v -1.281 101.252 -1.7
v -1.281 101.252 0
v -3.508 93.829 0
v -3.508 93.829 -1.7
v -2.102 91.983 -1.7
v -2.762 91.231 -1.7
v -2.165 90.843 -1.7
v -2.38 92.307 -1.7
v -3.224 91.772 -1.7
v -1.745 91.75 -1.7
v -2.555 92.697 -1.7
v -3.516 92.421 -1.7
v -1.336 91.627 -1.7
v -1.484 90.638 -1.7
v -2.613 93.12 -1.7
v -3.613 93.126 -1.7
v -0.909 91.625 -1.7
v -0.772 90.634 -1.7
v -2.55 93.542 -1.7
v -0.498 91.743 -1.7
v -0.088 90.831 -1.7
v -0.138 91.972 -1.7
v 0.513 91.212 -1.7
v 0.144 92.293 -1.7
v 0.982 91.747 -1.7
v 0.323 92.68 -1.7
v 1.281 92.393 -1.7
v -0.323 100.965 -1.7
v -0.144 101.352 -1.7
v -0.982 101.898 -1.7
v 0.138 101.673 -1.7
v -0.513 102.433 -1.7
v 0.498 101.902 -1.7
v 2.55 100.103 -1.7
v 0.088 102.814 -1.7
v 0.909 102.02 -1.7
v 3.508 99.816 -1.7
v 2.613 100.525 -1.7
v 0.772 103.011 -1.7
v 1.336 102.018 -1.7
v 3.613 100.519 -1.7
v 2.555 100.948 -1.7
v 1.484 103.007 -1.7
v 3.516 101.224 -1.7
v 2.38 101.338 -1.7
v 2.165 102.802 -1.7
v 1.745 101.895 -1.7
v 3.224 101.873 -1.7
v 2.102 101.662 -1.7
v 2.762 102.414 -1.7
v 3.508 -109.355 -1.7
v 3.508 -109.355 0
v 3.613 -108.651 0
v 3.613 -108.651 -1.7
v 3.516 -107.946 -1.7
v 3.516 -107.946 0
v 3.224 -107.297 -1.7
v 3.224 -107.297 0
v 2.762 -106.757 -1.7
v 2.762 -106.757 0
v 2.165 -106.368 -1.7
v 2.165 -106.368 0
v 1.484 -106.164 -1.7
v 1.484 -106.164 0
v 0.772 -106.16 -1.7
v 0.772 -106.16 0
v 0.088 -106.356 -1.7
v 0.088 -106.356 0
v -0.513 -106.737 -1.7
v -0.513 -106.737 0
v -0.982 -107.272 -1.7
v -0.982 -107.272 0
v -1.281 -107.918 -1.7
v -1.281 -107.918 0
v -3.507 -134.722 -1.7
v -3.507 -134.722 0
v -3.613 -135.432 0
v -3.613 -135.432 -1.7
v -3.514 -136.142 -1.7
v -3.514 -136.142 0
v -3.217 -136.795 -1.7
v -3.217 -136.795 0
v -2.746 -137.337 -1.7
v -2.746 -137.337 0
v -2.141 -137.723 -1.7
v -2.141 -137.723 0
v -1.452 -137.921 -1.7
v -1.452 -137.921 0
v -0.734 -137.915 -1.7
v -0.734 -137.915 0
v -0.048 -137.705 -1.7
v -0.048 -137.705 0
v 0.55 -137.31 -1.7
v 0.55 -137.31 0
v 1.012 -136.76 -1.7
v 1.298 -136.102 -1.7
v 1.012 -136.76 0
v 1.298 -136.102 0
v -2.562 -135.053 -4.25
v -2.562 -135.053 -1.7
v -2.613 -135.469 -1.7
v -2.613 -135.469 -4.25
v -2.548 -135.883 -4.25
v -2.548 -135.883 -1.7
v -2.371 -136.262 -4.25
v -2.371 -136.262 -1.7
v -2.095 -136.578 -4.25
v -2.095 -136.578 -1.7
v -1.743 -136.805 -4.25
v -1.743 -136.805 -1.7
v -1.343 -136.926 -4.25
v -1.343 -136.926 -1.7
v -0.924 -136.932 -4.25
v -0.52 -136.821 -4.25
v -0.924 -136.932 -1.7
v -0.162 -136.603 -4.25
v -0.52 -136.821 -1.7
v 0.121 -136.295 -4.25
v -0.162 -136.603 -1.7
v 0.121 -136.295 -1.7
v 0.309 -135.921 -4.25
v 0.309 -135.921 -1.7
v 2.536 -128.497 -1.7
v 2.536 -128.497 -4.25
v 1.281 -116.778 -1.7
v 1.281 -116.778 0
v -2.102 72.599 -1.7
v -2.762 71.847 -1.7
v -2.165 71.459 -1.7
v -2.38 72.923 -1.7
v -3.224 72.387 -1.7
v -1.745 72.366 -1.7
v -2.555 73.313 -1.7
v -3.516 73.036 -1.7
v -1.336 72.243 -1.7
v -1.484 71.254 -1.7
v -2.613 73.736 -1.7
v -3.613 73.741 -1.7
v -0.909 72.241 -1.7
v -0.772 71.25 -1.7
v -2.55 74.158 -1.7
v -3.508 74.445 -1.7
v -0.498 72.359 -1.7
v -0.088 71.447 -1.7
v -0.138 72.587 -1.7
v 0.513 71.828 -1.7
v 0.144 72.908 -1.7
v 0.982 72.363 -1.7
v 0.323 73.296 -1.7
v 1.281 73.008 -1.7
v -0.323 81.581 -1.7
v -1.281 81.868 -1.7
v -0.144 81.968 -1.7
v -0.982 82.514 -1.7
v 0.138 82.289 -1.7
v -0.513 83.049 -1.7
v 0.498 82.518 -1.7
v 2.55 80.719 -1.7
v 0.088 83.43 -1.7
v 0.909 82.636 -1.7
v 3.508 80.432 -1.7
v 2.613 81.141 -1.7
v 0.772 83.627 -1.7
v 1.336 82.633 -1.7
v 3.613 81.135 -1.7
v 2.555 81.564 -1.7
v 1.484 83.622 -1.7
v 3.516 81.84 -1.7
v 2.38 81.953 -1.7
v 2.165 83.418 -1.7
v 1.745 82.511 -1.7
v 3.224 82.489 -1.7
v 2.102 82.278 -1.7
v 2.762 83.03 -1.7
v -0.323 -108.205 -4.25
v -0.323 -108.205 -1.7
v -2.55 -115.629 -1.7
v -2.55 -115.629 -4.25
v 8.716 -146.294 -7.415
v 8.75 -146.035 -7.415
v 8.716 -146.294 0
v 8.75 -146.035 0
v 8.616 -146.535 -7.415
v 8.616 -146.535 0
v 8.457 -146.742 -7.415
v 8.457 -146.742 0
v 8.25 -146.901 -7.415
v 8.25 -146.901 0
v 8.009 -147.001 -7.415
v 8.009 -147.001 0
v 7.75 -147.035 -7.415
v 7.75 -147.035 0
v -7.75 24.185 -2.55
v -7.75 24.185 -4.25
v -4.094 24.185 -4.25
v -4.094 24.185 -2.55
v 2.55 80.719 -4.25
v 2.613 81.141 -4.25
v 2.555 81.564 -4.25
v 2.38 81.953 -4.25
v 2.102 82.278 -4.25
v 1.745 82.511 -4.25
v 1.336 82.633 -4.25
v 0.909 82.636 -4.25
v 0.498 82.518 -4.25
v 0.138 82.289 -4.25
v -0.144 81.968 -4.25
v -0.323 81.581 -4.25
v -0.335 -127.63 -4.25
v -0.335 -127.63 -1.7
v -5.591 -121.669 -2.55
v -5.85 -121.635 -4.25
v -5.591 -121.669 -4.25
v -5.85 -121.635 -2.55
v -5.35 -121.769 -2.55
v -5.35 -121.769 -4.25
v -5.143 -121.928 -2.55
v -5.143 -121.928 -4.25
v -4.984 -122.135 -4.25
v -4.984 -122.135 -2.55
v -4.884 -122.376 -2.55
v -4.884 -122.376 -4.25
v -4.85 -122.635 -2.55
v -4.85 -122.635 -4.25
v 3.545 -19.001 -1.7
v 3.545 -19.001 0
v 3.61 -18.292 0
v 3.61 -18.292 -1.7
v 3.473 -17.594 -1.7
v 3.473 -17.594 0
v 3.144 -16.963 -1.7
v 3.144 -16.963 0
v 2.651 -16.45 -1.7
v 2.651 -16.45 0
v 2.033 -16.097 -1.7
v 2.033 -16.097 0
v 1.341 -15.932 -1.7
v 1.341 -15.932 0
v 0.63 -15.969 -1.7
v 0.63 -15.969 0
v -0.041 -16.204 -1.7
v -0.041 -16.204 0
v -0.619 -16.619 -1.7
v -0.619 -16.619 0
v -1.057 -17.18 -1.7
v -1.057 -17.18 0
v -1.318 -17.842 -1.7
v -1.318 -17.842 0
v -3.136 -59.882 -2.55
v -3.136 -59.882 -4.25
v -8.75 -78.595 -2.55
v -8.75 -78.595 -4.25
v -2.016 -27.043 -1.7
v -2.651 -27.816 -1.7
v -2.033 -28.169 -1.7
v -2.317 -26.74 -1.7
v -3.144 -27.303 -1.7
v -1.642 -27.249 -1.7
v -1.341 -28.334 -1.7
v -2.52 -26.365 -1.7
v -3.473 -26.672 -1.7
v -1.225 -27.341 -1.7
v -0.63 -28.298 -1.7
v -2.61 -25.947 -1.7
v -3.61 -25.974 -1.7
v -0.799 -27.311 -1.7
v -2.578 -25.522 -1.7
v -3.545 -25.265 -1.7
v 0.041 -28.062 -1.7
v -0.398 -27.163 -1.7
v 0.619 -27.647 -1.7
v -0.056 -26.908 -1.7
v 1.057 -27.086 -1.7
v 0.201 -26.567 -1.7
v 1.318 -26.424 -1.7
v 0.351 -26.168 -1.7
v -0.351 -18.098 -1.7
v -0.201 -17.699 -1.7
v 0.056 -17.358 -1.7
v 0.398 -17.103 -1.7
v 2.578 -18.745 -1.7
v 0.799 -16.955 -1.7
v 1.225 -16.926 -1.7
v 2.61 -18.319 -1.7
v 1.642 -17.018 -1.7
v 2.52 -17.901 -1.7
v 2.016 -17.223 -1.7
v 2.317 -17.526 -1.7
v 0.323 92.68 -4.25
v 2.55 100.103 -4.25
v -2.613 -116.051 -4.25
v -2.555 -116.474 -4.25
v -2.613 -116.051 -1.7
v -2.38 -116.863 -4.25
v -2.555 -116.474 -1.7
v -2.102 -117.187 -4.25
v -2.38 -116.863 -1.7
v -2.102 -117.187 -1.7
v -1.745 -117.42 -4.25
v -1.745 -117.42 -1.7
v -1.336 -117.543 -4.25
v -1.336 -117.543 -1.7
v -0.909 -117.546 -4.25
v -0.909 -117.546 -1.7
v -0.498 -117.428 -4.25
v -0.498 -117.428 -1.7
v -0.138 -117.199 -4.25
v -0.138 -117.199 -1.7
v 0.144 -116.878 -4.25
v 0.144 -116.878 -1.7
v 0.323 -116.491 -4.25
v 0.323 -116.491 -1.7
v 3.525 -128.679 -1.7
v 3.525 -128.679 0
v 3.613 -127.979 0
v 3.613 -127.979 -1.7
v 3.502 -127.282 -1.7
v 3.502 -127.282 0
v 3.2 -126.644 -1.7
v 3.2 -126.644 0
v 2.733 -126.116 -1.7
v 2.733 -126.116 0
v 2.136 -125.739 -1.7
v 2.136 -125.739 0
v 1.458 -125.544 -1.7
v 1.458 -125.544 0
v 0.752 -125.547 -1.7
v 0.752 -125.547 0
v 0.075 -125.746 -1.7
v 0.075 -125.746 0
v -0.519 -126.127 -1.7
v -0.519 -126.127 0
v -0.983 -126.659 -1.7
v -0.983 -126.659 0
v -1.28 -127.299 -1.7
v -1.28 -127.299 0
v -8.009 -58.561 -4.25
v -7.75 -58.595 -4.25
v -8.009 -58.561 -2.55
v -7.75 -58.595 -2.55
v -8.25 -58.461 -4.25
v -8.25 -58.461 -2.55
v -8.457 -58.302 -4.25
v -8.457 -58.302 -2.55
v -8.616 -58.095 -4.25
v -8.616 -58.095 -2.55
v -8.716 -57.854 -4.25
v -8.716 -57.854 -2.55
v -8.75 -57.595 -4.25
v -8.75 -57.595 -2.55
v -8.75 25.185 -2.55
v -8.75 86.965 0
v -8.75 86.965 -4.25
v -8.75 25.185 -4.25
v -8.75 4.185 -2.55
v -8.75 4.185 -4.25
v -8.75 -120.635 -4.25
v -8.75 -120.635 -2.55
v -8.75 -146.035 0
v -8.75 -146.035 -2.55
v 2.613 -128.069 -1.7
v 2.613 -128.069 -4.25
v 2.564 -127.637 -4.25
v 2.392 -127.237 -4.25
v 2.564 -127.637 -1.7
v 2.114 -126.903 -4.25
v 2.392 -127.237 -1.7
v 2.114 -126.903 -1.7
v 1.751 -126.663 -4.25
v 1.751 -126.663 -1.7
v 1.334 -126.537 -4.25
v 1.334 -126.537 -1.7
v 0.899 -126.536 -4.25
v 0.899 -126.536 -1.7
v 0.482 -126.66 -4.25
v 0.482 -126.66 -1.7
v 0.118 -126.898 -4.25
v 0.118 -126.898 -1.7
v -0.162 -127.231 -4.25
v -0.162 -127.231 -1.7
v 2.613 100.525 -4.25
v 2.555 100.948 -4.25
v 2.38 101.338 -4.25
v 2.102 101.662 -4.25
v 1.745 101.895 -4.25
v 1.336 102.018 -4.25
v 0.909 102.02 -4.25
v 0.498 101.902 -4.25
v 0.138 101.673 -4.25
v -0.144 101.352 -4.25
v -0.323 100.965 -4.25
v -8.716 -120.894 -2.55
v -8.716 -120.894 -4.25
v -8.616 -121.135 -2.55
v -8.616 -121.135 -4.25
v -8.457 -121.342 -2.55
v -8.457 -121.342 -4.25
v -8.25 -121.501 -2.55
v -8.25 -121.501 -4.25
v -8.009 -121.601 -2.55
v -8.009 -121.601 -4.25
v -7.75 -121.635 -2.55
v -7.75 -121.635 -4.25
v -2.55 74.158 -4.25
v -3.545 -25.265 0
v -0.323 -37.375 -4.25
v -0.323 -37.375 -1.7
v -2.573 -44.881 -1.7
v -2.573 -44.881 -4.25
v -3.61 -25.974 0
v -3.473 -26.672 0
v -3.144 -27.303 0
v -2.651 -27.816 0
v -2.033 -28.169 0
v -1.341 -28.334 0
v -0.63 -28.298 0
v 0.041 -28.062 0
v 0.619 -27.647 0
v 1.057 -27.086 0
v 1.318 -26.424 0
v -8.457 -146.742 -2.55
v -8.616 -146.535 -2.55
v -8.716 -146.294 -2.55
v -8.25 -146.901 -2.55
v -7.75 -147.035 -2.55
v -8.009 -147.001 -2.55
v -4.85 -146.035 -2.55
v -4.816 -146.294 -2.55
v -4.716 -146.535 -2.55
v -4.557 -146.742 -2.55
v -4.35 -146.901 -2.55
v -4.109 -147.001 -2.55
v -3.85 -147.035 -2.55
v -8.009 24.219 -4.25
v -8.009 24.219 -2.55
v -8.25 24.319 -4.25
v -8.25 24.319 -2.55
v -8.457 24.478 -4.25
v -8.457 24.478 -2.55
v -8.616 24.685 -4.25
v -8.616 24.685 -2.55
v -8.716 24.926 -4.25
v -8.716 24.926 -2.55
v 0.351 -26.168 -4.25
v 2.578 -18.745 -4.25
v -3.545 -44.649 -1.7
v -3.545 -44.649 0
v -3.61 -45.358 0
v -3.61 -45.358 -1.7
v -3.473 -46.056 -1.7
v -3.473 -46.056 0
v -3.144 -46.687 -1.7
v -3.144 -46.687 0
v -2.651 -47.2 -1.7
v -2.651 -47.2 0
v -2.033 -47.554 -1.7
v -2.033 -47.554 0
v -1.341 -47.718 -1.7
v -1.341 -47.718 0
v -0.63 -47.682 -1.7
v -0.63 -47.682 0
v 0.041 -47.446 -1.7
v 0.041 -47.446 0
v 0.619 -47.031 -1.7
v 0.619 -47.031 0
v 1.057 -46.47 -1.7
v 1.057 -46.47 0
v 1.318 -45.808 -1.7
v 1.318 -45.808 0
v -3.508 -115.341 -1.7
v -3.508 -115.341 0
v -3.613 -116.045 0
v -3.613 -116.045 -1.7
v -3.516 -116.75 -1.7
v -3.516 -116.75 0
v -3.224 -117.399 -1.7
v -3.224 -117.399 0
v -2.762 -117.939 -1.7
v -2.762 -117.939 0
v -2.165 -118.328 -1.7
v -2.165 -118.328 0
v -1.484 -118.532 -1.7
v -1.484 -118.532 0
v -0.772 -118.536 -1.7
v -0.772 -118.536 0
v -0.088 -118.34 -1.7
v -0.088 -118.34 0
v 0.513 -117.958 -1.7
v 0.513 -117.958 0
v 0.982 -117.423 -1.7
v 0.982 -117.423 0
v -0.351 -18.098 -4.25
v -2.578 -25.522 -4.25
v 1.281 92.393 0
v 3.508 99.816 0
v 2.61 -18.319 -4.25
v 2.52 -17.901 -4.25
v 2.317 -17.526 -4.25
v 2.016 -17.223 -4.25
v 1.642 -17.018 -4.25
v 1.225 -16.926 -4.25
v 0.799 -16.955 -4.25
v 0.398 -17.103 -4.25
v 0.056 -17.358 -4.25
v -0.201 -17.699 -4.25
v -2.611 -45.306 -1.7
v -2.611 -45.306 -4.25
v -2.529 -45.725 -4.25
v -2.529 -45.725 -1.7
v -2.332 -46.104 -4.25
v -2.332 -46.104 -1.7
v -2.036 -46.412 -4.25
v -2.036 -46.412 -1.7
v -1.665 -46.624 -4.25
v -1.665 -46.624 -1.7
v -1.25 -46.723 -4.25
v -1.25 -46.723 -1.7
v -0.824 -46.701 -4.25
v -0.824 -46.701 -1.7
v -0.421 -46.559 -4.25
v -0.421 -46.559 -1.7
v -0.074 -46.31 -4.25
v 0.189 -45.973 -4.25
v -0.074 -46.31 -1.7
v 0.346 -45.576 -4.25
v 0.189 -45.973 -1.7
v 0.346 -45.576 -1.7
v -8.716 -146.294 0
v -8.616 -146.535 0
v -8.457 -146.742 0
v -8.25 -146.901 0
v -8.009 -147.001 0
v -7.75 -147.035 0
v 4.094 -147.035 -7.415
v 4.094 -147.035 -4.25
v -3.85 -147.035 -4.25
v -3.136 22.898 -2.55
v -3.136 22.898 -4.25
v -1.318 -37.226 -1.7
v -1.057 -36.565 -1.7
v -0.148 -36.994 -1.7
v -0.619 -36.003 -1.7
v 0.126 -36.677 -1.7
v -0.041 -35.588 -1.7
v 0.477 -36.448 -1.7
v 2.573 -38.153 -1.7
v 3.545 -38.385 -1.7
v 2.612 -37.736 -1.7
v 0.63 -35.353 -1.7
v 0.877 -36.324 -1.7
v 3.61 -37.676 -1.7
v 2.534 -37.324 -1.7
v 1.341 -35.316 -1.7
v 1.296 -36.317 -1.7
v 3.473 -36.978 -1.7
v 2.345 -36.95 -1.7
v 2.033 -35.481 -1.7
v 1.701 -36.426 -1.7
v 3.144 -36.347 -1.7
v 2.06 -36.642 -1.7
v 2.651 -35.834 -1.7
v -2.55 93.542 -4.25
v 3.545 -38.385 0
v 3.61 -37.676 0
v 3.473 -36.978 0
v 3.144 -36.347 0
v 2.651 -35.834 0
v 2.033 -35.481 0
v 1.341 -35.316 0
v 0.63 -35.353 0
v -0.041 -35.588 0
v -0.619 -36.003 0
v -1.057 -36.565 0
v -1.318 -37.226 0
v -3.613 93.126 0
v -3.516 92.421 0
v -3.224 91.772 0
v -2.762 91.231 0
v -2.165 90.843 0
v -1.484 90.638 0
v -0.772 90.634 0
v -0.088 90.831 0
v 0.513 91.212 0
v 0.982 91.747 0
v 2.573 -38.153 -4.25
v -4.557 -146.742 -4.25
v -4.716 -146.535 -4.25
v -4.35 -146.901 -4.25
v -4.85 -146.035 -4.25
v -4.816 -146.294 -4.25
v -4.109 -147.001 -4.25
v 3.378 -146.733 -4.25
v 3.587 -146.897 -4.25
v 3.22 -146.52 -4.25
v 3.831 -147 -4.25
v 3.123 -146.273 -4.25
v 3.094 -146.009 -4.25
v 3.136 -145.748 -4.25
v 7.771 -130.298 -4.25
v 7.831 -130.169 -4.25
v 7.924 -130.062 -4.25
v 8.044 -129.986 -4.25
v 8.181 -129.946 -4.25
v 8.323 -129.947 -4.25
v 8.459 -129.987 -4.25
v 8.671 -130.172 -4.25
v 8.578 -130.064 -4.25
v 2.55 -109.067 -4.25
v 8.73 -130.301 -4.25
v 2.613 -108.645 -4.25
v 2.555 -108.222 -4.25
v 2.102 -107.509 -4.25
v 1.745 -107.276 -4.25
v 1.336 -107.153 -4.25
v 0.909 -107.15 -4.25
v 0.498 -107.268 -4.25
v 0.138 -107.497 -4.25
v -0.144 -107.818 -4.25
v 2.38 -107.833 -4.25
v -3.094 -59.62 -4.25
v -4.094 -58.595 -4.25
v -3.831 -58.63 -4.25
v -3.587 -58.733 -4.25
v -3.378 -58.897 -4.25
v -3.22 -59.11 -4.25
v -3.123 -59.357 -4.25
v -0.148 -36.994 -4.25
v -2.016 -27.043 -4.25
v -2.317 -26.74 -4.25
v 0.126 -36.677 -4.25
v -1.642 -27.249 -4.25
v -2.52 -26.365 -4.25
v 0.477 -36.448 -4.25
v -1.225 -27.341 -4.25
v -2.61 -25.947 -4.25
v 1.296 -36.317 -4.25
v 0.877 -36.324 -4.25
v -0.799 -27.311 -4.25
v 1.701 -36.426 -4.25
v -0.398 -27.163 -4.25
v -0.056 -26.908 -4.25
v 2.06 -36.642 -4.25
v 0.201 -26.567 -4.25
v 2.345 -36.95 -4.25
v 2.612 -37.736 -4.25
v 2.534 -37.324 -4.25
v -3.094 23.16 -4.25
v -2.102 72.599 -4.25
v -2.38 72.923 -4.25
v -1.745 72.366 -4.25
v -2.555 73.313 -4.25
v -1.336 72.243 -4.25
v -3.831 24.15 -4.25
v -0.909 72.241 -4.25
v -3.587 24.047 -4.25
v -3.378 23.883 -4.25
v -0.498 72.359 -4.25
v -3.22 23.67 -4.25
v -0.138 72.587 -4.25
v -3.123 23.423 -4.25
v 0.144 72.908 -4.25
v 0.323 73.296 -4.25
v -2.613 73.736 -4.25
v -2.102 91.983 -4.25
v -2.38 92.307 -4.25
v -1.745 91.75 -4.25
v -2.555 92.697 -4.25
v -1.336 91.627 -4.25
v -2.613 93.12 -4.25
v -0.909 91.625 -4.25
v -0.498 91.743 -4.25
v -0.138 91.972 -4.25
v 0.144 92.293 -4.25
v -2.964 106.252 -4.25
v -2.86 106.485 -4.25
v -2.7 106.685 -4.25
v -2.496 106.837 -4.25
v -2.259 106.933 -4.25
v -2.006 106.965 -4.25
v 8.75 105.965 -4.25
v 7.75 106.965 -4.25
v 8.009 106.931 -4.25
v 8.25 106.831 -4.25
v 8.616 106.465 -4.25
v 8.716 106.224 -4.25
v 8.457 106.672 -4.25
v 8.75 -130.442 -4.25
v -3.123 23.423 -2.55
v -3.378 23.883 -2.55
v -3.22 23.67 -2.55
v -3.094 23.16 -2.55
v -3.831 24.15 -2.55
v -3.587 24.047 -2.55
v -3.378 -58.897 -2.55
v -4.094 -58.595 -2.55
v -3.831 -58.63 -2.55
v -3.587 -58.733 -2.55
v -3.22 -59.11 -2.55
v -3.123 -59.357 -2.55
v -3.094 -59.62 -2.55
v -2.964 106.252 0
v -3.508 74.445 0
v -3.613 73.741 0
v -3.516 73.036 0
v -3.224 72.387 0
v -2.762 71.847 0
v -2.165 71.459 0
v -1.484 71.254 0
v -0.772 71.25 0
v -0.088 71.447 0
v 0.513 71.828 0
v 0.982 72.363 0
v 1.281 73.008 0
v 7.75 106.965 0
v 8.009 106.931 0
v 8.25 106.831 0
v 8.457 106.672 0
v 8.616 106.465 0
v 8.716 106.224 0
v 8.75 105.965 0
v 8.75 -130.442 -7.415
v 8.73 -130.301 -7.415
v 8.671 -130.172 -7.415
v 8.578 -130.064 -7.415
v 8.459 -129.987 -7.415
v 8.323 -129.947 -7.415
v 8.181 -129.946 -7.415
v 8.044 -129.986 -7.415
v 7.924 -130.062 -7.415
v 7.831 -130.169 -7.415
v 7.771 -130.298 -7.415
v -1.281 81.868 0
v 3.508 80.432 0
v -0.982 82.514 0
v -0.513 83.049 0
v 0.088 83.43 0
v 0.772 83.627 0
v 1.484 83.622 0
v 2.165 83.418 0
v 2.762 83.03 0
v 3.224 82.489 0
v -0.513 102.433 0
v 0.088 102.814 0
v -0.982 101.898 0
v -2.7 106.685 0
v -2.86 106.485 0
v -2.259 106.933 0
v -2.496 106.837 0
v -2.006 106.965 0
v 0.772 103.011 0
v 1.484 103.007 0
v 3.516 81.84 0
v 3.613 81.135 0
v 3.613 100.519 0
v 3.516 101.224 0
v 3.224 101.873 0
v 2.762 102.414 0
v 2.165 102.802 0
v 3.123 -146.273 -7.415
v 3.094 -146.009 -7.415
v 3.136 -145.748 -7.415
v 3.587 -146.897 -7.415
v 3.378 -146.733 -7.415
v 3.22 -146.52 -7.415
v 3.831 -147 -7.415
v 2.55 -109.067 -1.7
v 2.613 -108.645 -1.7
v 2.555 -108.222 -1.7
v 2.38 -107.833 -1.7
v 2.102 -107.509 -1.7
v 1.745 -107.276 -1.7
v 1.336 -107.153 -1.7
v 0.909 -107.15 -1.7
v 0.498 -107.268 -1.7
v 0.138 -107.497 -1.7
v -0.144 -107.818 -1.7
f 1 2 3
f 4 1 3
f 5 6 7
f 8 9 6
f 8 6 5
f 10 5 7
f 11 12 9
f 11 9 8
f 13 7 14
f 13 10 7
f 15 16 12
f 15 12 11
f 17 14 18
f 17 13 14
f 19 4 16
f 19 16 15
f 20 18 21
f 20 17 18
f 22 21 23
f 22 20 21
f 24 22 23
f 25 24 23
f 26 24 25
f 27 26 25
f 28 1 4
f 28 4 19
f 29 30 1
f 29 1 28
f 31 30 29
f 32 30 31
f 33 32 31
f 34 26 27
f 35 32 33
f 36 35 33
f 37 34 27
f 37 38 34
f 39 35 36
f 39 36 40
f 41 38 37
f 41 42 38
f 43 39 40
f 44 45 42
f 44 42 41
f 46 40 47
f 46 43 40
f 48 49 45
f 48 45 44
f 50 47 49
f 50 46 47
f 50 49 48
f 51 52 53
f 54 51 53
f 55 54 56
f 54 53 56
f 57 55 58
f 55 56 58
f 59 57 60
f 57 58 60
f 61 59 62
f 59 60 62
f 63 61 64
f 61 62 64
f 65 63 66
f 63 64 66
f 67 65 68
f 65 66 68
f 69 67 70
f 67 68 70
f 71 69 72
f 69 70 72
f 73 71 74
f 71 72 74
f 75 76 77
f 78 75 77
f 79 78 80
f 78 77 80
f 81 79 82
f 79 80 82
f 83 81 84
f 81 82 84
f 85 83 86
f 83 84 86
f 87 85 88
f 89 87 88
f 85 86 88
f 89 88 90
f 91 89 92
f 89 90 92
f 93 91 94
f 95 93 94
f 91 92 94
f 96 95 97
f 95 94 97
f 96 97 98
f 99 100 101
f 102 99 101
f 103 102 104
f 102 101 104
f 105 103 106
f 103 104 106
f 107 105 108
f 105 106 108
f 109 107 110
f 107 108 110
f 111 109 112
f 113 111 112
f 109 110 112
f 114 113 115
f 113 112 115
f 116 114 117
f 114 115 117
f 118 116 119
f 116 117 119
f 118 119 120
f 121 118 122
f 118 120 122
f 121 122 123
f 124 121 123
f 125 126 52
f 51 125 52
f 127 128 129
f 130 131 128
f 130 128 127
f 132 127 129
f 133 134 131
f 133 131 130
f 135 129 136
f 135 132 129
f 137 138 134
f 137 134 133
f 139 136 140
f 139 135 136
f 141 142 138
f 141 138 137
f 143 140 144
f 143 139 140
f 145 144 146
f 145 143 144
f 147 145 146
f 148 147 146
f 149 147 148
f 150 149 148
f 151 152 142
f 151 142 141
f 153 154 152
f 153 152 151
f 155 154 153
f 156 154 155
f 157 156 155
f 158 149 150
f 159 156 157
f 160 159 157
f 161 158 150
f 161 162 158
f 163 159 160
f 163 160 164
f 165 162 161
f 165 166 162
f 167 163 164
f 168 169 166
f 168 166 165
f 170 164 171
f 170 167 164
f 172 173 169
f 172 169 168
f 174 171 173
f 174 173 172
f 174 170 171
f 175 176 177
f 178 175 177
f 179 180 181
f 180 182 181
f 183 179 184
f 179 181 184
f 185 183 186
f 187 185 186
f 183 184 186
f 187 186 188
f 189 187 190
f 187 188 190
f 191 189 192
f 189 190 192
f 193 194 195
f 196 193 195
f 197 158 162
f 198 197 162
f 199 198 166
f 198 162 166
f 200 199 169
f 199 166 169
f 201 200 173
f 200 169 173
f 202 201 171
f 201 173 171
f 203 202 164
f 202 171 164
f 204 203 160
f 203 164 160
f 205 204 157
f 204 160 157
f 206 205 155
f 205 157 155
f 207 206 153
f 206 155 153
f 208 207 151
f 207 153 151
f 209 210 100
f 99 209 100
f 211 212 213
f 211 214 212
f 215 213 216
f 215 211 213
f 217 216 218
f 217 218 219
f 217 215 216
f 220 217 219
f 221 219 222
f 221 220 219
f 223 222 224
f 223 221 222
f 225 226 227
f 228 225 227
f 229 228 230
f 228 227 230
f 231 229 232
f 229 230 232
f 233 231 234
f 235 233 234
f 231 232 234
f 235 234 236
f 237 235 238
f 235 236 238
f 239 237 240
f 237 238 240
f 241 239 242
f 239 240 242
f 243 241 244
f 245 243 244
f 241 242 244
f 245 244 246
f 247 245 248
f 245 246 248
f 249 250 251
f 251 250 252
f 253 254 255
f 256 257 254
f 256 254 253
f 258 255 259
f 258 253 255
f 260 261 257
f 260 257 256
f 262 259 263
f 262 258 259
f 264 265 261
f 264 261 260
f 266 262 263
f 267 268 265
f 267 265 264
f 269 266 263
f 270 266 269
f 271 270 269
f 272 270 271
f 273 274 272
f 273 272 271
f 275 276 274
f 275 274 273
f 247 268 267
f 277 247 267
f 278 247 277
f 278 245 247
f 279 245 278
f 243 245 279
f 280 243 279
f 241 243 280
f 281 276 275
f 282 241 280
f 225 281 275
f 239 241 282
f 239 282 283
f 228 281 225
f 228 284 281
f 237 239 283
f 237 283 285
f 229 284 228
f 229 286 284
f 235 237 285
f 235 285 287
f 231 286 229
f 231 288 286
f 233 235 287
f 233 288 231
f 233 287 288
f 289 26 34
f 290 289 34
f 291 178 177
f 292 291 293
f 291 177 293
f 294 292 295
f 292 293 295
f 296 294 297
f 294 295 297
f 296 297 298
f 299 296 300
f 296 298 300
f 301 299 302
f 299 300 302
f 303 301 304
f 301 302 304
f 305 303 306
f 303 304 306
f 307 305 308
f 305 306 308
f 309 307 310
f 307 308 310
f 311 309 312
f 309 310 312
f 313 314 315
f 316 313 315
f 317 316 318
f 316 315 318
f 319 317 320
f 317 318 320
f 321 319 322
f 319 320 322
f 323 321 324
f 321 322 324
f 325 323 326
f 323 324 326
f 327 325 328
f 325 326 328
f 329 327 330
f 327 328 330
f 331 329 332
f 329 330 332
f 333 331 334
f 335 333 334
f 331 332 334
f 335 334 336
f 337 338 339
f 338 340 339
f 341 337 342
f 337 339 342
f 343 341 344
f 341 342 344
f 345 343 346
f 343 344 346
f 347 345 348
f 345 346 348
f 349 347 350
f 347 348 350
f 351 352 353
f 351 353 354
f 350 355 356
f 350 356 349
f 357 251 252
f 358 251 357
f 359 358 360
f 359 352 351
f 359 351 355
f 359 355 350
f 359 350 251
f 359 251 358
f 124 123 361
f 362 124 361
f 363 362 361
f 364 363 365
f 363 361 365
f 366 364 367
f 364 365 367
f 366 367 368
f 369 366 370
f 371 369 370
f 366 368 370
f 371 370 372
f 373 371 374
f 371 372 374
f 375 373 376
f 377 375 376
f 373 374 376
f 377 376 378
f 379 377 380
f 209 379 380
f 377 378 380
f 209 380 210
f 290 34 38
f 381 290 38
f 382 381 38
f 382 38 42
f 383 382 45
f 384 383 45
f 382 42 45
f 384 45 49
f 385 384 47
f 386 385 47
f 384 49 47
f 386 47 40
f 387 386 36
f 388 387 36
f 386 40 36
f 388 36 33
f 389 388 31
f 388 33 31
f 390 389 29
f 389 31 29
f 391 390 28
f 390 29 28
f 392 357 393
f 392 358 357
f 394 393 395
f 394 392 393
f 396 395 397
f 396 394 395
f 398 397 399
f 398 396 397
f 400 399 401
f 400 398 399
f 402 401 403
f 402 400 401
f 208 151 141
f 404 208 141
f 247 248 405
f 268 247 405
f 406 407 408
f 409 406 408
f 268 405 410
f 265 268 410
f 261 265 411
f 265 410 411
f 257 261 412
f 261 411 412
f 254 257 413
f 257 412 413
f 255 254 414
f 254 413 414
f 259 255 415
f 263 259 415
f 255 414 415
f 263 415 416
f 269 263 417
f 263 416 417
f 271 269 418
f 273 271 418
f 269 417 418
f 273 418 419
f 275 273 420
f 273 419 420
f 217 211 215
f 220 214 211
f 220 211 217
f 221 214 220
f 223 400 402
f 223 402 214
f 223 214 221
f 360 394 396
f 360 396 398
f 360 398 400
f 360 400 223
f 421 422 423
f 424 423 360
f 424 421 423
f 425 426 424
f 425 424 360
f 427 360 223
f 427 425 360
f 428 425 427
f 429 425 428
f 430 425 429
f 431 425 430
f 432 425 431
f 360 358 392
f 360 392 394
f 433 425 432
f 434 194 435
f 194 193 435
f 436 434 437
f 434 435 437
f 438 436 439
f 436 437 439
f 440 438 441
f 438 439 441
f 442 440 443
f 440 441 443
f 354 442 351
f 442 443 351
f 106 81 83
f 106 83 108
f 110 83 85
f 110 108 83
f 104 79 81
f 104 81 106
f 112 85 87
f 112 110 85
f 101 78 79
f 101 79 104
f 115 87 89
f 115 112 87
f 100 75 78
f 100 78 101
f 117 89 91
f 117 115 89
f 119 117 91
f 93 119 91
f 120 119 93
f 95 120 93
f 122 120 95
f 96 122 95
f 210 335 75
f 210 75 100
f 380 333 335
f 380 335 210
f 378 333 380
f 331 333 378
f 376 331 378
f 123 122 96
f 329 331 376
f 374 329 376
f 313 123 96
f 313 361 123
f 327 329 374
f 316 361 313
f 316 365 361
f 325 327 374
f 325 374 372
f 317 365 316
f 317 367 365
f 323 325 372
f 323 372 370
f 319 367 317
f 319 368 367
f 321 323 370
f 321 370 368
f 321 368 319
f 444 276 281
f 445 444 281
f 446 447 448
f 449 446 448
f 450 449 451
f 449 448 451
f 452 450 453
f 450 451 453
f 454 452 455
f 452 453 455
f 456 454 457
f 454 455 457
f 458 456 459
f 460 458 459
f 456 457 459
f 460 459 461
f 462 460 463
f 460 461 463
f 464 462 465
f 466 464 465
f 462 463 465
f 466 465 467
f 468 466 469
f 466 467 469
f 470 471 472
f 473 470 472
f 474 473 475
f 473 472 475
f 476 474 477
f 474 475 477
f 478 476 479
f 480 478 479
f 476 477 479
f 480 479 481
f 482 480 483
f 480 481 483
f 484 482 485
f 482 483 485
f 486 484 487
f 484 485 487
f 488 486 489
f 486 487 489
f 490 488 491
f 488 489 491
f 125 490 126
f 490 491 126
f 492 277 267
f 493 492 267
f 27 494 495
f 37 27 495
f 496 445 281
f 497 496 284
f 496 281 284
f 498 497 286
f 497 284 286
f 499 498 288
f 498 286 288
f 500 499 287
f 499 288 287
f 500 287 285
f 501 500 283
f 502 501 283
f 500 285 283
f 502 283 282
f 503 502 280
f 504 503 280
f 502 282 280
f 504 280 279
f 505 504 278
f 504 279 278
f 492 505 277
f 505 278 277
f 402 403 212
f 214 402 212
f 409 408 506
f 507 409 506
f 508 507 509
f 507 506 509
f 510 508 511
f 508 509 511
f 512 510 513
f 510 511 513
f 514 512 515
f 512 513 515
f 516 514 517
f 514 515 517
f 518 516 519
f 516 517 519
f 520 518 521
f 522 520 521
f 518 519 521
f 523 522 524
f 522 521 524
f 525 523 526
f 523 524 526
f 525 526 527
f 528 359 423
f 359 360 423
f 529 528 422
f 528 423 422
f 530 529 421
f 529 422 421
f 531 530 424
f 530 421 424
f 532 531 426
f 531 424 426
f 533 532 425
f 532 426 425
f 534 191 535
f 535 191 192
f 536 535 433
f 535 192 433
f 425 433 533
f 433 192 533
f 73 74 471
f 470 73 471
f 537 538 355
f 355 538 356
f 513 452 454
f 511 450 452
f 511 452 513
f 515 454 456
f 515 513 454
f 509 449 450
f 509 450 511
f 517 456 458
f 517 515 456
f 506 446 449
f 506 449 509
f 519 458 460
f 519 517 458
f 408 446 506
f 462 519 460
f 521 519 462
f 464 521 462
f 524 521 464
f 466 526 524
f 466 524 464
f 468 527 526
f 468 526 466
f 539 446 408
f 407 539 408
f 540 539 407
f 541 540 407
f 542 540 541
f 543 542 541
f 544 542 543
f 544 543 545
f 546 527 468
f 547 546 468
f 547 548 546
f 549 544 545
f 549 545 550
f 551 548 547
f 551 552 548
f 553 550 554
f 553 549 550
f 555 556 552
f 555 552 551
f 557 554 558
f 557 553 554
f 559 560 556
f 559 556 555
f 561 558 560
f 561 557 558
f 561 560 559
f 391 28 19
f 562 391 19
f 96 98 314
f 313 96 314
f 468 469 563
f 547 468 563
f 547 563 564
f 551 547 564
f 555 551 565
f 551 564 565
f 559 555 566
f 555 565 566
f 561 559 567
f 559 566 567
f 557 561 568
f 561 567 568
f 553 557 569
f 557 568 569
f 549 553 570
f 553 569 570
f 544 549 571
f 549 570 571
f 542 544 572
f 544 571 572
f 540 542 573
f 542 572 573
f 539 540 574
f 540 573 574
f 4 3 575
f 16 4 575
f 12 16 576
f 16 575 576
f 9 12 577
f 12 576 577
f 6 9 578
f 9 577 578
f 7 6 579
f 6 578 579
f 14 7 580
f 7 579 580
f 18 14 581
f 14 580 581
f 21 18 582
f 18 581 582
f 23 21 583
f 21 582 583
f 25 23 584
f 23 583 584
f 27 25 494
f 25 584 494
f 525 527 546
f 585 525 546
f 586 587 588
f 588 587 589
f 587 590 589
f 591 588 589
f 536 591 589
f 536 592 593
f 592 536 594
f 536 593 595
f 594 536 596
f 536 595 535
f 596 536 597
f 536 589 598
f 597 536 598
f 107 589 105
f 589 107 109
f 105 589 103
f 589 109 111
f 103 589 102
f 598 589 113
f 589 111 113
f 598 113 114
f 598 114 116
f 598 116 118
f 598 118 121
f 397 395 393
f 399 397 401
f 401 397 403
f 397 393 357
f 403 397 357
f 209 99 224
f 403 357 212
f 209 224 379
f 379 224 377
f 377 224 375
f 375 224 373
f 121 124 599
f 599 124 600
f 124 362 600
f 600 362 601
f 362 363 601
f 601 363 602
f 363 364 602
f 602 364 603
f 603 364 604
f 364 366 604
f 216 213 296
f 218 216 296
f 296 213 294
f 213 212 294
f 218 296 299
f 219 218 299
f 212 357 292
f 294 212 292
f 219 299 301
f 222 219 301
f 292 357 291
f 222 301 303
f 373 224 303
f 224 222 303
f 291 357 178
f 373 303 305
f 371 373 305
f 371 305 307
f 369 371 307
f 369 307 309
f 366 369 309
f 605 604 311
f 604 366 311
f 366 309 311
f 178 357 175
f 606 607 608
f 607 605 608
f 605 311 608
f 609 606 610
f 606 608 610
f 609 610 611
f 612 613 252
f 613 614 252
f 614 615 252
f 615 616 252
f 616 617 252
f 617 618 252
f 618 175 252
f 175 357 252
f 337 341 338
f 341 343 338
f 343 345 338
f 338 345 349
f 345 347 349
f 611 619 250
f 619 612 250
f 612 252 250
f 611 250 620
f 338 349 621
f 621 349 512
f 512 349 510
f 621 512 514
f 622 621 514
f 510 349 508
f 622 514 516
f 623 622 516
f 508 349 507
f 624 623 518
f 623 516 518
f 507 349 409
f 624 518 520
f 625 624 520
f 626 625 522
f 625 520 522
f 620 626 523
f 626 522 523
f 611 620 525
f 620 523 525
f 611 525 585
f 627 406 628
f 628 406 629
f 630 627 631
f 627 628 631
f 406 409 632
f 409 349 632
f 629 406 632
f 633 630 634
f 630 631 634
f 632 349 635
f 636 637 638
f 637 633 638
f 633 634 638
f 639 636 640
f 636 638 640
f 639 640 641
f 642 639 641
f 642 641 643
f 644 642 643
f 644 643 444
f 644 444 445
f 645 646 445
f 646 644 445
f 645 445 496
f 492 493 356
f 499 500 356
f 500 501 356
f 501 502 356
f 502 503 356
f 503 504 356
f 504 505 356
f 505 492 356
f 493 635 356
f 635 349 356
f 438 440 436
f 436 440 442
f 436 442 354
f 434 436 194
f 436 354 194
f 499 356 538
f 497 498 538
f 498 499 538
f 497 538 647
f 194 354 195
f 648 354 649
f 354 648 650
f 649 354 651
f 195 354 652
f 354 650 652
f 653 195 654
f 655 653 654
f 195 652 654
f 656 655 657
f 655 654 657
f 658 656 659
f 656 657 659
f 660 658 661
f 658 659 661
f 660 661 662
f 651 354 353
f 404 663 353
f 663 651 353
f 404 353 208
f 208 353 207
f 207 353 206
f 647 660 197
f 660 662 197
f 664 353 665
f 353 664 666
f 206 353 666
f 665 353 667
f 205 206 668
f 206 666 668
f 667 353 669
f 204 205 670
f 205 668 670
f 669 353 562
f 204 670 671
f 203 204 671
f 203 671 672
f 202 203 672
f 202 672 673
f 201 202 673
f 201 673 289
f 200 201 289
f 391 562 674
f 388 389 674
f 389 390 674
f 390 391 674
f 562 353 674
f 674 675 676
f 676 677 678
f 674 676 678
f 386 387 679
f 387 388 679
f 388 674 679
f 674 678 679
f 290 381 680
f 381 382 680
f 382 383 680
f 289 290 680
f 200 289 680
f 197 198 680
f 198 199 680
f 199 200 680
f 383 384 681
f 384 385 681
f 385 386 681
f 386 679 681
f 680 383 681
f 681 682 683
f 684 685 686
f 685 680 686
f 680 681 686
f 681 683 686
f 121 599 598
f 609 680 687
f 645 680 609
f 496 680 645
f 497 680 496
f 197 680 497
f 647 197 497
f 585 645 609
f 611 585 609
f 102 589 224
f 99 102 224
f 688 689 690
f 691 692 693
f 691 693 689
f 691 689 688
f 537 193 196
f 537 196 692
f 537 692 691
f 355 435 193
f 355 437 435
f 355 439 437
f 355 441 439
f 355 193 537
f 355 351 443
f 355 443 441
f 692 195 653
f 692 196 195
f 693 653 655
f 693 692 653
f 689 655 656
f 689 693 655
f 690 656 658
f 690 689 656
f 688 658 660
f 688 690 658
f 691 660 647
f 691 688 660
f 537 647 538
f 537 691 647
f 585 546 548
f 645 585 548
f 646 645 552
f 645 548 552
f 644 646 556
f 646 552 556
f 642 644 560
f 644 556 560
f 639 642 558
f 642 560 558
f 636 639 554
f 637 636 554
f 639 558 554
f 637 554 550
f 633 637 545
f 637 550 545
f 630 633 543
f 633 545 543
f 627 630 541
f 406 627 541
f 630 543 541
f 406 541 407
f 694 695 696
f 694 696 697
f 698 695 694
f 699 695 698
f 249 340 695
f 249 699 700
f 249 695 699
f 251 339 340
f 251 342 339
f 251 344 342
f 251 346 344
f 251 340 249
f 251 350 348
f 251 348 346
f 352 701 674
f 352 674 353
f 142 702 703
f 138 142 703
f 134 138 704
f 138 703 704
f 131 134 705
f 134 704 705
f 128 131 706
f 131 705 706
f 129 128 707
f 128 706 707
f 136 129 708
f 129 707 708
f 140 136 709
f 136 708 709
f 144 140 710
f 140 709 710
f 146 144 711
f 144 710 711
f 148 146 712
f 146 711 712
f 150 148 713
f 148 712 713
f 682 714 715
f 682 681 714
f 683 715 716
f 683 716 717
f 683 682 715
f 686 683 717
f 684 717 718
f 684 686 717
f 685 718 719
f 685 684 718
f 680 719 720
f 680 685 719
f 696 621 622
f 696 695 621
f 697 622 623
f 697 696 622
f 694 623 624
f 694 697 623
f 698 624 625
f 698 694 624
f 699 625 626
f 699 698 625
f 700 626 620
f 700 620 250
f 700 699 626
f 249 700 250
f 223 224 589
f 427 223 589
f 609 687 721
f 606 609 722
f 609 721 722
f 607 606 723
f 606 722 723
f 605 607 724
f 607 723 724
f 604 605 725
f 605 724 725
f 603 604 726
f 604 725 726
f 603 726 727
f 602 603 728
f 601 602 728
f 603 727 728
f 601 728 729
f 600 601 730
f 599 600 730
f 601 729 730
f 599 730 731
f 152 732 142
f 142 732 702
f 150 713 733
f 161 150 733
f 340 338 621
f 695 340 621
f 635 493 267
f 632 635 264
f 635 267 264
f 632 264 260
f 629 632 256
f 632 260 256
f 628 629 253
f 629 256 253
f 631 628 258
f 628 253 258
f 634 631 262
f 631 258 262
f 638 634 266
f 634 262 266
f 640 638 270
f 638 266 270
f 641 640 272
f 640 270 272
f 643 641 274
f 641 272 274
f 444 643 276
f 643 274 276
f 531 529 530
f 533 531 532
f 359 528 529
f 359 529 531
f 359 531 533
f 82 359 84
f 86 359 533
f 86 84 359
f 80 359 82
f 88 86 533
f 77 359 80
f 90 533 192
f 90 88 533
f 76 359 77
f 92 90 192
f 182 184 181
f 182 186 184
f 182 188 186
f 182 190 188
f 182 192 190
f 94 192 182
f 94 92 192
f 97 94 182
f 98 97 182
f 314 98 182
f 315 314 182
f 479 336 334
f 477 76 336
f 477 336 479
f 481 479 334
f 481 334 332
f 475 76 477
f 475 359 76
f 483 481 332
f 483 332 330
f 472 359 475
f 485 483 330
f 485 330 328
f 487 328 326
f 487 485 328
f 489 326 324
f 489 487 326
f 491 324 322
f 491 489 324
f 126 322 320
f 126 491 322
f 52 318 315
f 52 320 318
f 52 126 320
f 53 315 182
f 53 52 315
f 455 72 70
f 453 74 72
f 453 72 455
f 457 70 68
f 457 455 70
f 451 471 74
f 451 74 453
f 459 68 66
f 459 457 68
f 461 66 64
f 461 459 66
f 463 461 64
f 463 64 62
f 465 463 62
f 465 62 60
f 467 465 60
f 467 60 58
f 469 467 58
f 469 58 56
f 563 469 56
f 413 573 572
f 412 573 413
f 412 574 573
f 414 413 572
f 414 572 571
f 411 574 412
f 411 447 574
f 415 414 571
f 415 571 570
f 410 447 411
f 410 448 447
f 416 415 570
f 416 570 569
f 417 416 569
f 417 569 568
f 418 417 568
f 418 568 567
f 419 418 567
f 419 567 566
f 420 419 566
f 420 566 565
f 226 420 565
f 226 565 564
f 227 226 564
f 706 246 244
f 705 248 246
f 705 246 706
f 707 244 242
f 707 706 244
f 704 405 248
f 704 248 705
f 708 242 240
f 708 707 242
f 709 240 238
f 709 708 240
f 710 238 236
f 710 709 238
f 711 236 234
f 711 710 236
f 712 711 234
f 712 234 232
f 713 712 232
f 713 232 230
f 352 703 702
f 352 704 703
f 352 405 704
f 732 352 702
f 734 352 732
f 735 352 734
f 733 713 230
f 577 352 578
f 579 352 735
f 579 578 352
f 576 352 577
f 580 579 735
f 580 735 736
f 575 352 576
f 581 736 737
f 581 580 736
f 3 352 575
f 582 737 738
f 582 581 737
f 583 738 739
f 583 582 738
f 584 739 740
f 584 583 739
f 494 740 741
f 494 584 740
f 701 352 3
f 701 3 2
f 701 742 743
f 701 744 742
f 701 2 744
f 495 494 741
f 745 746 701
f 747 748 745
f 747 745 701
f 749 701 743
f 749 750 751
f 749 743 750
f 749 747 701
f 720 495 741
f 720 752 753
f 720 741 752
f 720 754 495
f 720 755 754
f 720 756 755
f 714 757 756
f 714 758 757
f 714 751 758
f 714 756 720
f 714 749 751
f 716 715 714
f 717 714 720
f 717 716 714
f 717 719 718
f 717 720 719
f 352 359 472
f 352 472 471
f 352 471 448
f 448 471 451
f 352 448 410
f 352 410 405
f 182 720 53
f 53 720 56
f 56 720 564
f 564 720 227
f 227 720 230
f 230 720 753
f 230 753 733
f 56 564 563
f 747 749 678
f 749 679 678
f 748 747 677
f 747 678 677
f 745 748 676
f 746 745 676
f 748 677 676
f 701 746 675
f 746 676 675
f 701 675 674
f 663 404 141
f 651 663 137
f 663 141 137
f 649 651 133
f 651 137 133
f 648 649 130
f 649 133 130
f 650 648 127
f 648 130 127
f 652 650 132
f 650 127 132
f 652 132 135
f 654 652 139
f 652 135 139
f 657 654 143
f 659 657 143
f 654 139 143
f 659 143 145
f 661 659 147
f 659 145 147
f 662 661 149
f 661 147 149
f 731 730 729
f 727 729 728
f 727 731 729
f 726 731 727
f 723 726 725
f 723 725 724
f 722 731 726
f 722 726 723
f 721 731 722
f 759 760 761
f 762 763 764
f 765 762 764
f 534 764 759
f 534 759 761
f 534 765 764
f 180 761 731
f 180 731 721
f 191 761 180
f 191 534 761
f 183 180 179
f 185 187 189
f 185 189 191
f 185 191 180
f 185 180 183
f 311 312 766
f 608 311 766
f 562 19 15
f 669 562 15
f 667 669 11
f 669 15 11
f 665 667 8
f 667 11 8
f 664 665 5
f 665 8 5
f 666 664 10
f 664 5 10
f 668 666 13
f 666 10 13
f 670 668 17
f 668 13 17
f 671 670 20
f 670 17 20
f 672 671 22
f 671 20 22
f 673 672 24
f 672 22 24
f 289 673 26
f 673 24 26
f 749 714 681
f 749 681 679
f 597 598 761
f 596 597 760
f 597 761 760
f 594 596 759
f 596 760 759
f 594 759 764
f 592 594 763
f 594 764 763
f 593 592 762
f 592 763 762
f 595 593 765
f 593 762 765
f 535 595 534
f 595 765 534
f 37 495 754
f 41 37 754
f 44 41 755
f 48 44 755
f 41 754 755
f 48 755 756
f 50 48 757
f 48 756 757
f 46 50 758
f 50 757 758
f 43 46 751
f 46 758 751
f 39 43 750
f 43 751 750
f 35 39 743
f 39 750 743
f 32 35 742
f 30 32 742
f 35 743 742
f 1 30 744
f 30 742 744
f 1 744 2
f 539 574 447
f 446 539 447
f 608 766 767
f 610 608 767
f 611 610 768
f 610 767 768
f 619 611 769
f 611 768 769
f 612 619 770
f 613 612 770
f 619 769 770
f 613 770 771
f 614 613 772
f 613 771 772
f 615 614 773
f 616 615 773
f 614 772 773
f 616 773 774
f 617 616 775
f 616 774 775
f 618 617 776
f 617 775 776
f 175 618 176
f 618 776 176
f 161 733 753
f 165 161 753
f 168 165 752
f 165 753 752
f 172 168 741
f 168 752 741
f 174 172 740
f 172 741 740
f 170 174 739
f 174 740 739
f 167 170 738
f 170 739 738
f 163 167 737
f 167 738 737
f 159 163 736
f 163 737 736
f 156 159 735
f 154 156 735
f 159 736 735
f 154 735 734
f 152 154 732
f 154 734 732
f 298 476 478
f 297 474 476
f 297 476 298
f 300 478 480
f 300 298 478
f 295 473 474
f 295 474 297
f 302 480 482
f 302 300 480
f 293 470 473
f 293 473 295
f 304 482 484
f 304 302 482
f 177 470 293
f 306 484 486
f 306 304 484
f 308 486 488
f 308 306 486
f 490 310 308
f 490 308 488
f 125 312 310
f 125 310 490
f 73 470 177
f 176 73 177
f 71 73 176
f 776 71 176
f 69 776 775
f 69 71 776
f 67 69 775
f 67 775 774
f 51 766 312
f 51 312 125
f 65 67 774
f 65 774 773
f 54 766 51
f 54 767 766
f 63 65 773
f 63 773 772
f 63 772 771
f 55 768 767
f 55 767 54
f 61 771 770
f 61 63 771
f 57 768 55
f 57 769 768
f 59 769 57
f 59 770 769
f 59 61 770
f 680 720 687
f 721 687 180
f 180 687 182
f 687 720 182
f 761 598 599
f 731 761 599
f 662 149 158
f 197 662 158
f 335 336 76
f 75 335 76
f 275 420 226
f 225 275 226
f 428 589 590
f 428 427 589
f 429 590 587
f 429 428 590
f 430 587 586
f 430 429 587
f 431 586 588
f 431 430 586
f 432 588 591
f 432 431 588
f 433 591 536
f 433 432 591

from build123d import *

# Parameters (mm, degrees)
F1_DEPTH    = 4.25
F2_W        = 3.9
F2_H        = 25.4
F3_DEPTH    = 1.7
F4_DEPTH    = 3.165
F5_R        = 1
F6_T1_DEPTH = 11.6817943787
F8_DEPTH    = 1.7
F9_DEPTH    = 25


# Not quite as in the source:
# - a fillet or chamfer that OpenCascade refuses, or shapes differently, is made with other operations: its cross-section is extruded or revolved along the edge and cut away or added
# - a feature names something its author has since deleted; it is built from what else it names


with BuildPart() as f1:
    # F0 (on Top) → F1 (new body)
    with BuildSketch(Plane.XY):
        Polygon((8.75, 106.9650896668), (-2.75, 106.9650896668), (-8.75, 86.9647799072), (-8.75, -147.0349103332), (8.75, -147.0349103332), align=None)
    extrude(amount=-F1_DEPTH)

    # F2 (on face) → F3 (cut)
    with BuildSketch(Plane(origin=(0, 0, -4.25), x_dir=(1, 0, 0), z_dir=(0, 0, -1))):
        with Locations((-6.8, 134.3349103332)):
            Rectangle(F2_W, F2_H)
        Polygon((-8.75, 78.5952200928), (-8.75, 58.5949103332), (-2.75, 58.5949103332), align=None)
        Polygon((-8.75, -4.1847799072), (-8.75, -24.1850896668), (-2.75, -24.1850896668), align=None)
    extrude(amount=-F3_DEPTH, mode=Mode.SUBTRACT)

    # F2 (on face) → F4 (join)
    with BuildSketch(Plane(origin=(0, 0, -4.25), x_dir=(1, 0, 0), z_dir=(0, 0, -1))):
        Polygon((2.75, 147.0349103332), (8.75, 127.0349103332), (8.75, 147.0349103332), align=None)
    extrude(amount=F4_DEPTH)

    # F5
    f5_edges = [f1.edges().sort_by_distance(p)[0] for p in [
        (-2.75, -58.59491, -3.4),
        (-8.75, -58.59491, -3.4),
        (-4.85, -121.63491, -3.4),
        (-8.75, -121.63491, -3.4),
        (-4.85, -147.03491, -3.4),
        (-8.75, -147.03491, -1.275),
        (8.75, -147.03491, -3.7075),
        (2.75, -147.03491, -5.8325),
        (-2.75, 24.18509, -3.4),
        (-8.75, 24.18509, -3.4),
        (8.75, 106.96509, -2.125),
        (-2.75, 106.96509, -2.125),
    ]]
    fillet(f5_edges, radius=F5_R)

    # F6: fillet of radius 0.5 on 1 edges, made by hand

    # F6_s2 → F6_t1 (cut)
    with BuildSketch(Plane.XY.offset(-15.9317943787)):
        with BuildLine():
            ThreePointArc((8.75, -130.4416280846), (8.3226065723, -129.9469278869), (7.7710868574, -130.2979541419))
            Line((7.7710868574, -130.2979541419), (8.75, -127.0349103332))
            Line((8.75, -127.0349103332), (8.75, -130.4416280846))
        make_face()
    extrude(amount=F6_T1_DEPTH, mode=Mode.SUBTRACT)

    # F7 (on face) → F8 (cut)
    with BuildSketch(Plane.XY):
        with BuildLine():
            Line((-1.281113759, 101.2524492275), (-3.5080282296, 93.8292860243))
            ThreePointArc((-3.5080282296, 93.8292860243), (-1.8318189791, 90.7163576177), (1.2811093315, 92.3925670464))
            Line((1.2811093315, 92.3925670464), (3.508023802, 99.8157302495))
            ThreePointArc((3.508023802, 99.8157302495), (1.831814489, 102.9286584474), (-1.281113759, 101.2524492275))
        make_face()
        with BuildLine():
            Line((2.5501962221, 100.1030738196), (0.3232817516, 92.6799106164))
            ThreePointArc((0.3232817516, 92.6799106164), (-1.5444751953, 91.6741851335), (-2.5502007779, 93.5419420268))
            Line((-2.5502007779, 93.5419420268), (-0.3232863074, 100.9651052299))
            ThreePointArc((-0.3232863074, 100.9651052299), (1.5444707052, 101.9708309316), (2.5501962221, 100.1030738196))
        make_face(mode=Mode.SUBTRACT)
        with BuildLine():
            Line((-1.281113759, 81.8682859589), (-3.5080282296, 74.4451227557))
            ThreePointArc((-3.5080282296, 74.4451227557), (-1.8318189791, 71.3321943492), (1.2811093315, 73.0084037778))
            Line((1.2811093315, 73.0084037778), (3.508023802, 80.431566981))
            ThreePointArc((3.508023802, 80.431566981), (1.831814489, 83.5444951788), (-1.281113759, 81.8682859589))
        make_face()
        with BuildLine():
            Line((2.5501962221, 80.718910551), (0.3232817516, 73.2957473478))
            ThreePointArc((0.3232817516, 73.2957473478), (-1.5444751953, 72.2900218649), (-2.5502007779, 74.1577787582))
            Line((-2.5502007779, 74.1577787582), (-0.3232863074, 81.5809419614))
            ThreePointArc((-0.3232863074, 81.5809419614), (1.5444707052, 82.586667663), (2.5501962221, 80.718910551))
        make_face(mode=Mode.SUBTRACT)
        with BuildLine():
            Line((-1.3184834487, -37.2262845319), (-3.5453934487, -44.6494328331))
            ThreePointArc((-3.5453934487, -44.6494328331), (-1.6928299922, -47.6607462741), (1.3184834487, -45.8081828176))
            Line((1.3184834487, -45.8081828176), (3.5453934487, -38.3850345164))
            ThreePointArc((3.5453934487, -38.3850345164), (1.6928299922, -35.3737210755), (-1.3184834487, -37.2262845319))
        make_face()
        with BuildLine():
            ThreePointArc((-0.32342291, -37.3750995728), (1.5027069877, -36.3570453968), (2.5726180692, -38.1532845195))
            Line((2.5726180692, -38.1532845195), (0.3457080692, -45.5764328207))
            ThreePointArc((0.3457080692, -45.5764328207), (-1.4610799953, -46.6879708946), (-2.5726180692, -44.88118283))
            Line((-2.5726180692, -44.88118283), (-0.32342291, -37.3750995728))
        make_face(mode=Mode.SUBTRACT)
        with BuildLine():
            ThreePointArc((-3.5453934487, -25.2652845319), (-1.6928299922, -28.2765979729), (1.3184834487, -26.4240345164))
            Line((1.3184834487, -26.4240345164), (3.5453979193, -19.0008713133))
            ThreePointArc((3.5453979193, -19.0008713133), (1.6928344628, -15.9895578723), (-1.3184789782, -17.8421213288))
            Line((-1.3184789782, -17.8421213288), (-3.5453934487, -25.2652845319))
        make_face()
        with BuildLine():
            ThreePointArc((0.3513294529, -26.167779481), (-1.4365749568, -27.3094439771), (-2.5782394529, -25.5215395674))
            Line((-2.5782394529, -25.5215395674), (-0.3513249813, -18.0983763605))
            ThreePointArc((-0.3513249813, -18.0983763605), (1.4365749587, -16.9567321352), (2.5782439235, -18.7446162778))
            Line((2.5782439235, -18.7446162778), (0.3513294529, -26.167779481))
        make_face(mode=Mode.SUBTRACT)
        with BuildLine():
            Line((-1.2811093046, -107.9180212426), (-3.5080237752, -115.3411844458))
            ThreePointArc((-3.5080237752, -115.3411844458), (-1.8318145066, -118.4541127276), (1.2811137752, -116.7779034591))
            Line((1.2811137752, -116.7779034591), (3.5080282457, -109.3547402559))
            ThreePointArc((3.5080282457, -109.3547402559), (1.8318145067, -106.2418268761), (-1.2811093046, -107.9180212426))
        make_face()
        with BuildLine():
            ThreePointArc((-0.3232817945, -108.2053650453), (1.544470704, -107.1996543861), (2.5502007356, -109.0673964532))
            Line((2.5502007356, -109.0673964532), (0.3232862651, -116.4905596564))
            ThreePointArc((0.3232862651, -116.4905596564), (-1.544470704, -117.4962852176), (-2.5501962651, -115.6285282484))
            Line((-2.5501962651, -115.6285282484), (-0.3232817945, -108.2053650453))
        make_face(mode=Mode.SUBTRACT)
        with BuildLine():
            Line((-1.280113287, -127.2988486416), (-3.507023287, -134.7220131859))
            ThreePointArc((-3.507023287, -134.7220131859), (-1.8036595485, -137.8465346478), (1.2982333531, -136.1023033504))
            Line((1.2982333531, -136.1023033504), (3.5251433531, -128.6791388061))
            ThreePointArc((3.5251433531, -128.6791388061), (1.8036595485, -125.6176994193), (-1.280113287, -127.2988486416))
        make_face()
        with BuildLine():
            ThreePointArc((0.308713365, -135.9206030083), (-1.5472756815, -136.8795961043), (-2.5617754063, -135.0533558662))
            Line((-2.5617754063, -135.0533558662), (-0.3348654063, -127.6301913219))
            ThreePointArc((-0.3348654063, -127.6301913219), (1.5472756815, -126.5846379628), (2.535623365, -128.4974384639))
            Line((2.535623365, -128.4974384639), (0.308713365, -135.9206030083))
        make_face(mode=Mode.SUBTRACT)
    extrude(amount=-F8_DEPTH, mode=Mode.SUBTRACT)

    # F7 (on face) → F9 (cut)
    with BuildSketch(Plane.XY):
        with BuildLine():
            Line((-0.3348654063, -127.6301913219), (-2.5617754063, -135.0533558662))
            ThreePointArc((-2.5617754063, -135.0533558662), (-1.5472756815, -136.8795961043), (0.308713365, -135.9206030083))
            Line((0.308713365, -135.9206030083), (2.535623365, -128.4974384639))
            ThreePointArc((2.535623365, -128.4974384639), (1.5472756815, -126.5846379628), (-0.3348654063, -127.6301913219))
        make_face()
        with BuildLine():
            Line((0.3232862651, -116.4905596564), (2.5502007356, -109.0673964532))
            ThreePointArc((2.5502007356, -109.0673964532), (1.544470704, -107.1996543861), (-0.3232817945, -108.2053650453))
            Line((-0.3232817945, -108.2053650453), (-2.5501962651, -115.6285282484))
            ThreePointArc((-2.5501962651, -115.6285282484), (-1.544470704, -117.4962852176), (0.3232862651, -116.4905596564))
        make_face()
        with BuildLine():
            Line((0.3457080692, -45.5764328207), (2.5726180692, -38.1532845195))
            ThreePointArc((2.5726180692, -38.1532845195), (1.5027069877, -36.3570453968), (-0.32342291, -37.3750995728))
            Line((-0.32342291, -37.3750995728), (-2.5726180692, -44.88118283))
            ThreePointArc((-2.5726180692, -44.88118283), (-1.4610799953, -46.6879708946), (0.3457080692, -45.5764328207))
        make_face()
        with BuildLine():
            Line((-0.3513249813, -18.0983763605), (-2.5782394529, -25.5215395674))
            ThreePointArc((-2.5782394529, -25.5215395674), (-1.4365749568, -27.3094439771), (0.3513294529, -26.167779481))
            Line((0.3513294529, -26.167779481), (2.5782439235, -18.7446162778))
            ThreePointArc((2.5782439235, -18.7446162778), (1.4365749587, -16.9567321352), (-0.3513249813, -18.0983763605))
        make_face()
        with BuildLine():
            ThreePointArc((-2.5502007779, 93.5419420268), (-1.5444751953, 91.6741851335), (0.3232817516, 92.6799106164))
            Line((0.3232817516, 92.6799106164), (2.5501962221, 100.1030738196))
            ThreePointArc((2.5501962221, 100.1030738196), (1.5444707052, 101.9708309316), (-0.3232863074, 100.9651052299))
            Line((-0.3232863074, 100.9651052299), (-2.5502007779, 93.5419420268))
        make_face()
        with BuildLine():
            ThreePointArc((-2.5502007779, 74.1577787582), (-1.5444751953, 72.2900218649), (0.3232817516, 73.2957473478))
            Line((0.3232817516, 73.2957473478), (2.5501962221, 80.718910551))
            ThreePointArc((2.5501962221, 80.718910551), (1.5444707052, 82.586667663), (-0.3232863074, 81.5809419614))
            Line((-0.3232863074, 81.5809419614), (-2.5502007779, 74.1577787582))
        make_face()
    extrude(amount=-F9_DEPTH, mode=Mode.SUBTRACT)


solid = f1.part
